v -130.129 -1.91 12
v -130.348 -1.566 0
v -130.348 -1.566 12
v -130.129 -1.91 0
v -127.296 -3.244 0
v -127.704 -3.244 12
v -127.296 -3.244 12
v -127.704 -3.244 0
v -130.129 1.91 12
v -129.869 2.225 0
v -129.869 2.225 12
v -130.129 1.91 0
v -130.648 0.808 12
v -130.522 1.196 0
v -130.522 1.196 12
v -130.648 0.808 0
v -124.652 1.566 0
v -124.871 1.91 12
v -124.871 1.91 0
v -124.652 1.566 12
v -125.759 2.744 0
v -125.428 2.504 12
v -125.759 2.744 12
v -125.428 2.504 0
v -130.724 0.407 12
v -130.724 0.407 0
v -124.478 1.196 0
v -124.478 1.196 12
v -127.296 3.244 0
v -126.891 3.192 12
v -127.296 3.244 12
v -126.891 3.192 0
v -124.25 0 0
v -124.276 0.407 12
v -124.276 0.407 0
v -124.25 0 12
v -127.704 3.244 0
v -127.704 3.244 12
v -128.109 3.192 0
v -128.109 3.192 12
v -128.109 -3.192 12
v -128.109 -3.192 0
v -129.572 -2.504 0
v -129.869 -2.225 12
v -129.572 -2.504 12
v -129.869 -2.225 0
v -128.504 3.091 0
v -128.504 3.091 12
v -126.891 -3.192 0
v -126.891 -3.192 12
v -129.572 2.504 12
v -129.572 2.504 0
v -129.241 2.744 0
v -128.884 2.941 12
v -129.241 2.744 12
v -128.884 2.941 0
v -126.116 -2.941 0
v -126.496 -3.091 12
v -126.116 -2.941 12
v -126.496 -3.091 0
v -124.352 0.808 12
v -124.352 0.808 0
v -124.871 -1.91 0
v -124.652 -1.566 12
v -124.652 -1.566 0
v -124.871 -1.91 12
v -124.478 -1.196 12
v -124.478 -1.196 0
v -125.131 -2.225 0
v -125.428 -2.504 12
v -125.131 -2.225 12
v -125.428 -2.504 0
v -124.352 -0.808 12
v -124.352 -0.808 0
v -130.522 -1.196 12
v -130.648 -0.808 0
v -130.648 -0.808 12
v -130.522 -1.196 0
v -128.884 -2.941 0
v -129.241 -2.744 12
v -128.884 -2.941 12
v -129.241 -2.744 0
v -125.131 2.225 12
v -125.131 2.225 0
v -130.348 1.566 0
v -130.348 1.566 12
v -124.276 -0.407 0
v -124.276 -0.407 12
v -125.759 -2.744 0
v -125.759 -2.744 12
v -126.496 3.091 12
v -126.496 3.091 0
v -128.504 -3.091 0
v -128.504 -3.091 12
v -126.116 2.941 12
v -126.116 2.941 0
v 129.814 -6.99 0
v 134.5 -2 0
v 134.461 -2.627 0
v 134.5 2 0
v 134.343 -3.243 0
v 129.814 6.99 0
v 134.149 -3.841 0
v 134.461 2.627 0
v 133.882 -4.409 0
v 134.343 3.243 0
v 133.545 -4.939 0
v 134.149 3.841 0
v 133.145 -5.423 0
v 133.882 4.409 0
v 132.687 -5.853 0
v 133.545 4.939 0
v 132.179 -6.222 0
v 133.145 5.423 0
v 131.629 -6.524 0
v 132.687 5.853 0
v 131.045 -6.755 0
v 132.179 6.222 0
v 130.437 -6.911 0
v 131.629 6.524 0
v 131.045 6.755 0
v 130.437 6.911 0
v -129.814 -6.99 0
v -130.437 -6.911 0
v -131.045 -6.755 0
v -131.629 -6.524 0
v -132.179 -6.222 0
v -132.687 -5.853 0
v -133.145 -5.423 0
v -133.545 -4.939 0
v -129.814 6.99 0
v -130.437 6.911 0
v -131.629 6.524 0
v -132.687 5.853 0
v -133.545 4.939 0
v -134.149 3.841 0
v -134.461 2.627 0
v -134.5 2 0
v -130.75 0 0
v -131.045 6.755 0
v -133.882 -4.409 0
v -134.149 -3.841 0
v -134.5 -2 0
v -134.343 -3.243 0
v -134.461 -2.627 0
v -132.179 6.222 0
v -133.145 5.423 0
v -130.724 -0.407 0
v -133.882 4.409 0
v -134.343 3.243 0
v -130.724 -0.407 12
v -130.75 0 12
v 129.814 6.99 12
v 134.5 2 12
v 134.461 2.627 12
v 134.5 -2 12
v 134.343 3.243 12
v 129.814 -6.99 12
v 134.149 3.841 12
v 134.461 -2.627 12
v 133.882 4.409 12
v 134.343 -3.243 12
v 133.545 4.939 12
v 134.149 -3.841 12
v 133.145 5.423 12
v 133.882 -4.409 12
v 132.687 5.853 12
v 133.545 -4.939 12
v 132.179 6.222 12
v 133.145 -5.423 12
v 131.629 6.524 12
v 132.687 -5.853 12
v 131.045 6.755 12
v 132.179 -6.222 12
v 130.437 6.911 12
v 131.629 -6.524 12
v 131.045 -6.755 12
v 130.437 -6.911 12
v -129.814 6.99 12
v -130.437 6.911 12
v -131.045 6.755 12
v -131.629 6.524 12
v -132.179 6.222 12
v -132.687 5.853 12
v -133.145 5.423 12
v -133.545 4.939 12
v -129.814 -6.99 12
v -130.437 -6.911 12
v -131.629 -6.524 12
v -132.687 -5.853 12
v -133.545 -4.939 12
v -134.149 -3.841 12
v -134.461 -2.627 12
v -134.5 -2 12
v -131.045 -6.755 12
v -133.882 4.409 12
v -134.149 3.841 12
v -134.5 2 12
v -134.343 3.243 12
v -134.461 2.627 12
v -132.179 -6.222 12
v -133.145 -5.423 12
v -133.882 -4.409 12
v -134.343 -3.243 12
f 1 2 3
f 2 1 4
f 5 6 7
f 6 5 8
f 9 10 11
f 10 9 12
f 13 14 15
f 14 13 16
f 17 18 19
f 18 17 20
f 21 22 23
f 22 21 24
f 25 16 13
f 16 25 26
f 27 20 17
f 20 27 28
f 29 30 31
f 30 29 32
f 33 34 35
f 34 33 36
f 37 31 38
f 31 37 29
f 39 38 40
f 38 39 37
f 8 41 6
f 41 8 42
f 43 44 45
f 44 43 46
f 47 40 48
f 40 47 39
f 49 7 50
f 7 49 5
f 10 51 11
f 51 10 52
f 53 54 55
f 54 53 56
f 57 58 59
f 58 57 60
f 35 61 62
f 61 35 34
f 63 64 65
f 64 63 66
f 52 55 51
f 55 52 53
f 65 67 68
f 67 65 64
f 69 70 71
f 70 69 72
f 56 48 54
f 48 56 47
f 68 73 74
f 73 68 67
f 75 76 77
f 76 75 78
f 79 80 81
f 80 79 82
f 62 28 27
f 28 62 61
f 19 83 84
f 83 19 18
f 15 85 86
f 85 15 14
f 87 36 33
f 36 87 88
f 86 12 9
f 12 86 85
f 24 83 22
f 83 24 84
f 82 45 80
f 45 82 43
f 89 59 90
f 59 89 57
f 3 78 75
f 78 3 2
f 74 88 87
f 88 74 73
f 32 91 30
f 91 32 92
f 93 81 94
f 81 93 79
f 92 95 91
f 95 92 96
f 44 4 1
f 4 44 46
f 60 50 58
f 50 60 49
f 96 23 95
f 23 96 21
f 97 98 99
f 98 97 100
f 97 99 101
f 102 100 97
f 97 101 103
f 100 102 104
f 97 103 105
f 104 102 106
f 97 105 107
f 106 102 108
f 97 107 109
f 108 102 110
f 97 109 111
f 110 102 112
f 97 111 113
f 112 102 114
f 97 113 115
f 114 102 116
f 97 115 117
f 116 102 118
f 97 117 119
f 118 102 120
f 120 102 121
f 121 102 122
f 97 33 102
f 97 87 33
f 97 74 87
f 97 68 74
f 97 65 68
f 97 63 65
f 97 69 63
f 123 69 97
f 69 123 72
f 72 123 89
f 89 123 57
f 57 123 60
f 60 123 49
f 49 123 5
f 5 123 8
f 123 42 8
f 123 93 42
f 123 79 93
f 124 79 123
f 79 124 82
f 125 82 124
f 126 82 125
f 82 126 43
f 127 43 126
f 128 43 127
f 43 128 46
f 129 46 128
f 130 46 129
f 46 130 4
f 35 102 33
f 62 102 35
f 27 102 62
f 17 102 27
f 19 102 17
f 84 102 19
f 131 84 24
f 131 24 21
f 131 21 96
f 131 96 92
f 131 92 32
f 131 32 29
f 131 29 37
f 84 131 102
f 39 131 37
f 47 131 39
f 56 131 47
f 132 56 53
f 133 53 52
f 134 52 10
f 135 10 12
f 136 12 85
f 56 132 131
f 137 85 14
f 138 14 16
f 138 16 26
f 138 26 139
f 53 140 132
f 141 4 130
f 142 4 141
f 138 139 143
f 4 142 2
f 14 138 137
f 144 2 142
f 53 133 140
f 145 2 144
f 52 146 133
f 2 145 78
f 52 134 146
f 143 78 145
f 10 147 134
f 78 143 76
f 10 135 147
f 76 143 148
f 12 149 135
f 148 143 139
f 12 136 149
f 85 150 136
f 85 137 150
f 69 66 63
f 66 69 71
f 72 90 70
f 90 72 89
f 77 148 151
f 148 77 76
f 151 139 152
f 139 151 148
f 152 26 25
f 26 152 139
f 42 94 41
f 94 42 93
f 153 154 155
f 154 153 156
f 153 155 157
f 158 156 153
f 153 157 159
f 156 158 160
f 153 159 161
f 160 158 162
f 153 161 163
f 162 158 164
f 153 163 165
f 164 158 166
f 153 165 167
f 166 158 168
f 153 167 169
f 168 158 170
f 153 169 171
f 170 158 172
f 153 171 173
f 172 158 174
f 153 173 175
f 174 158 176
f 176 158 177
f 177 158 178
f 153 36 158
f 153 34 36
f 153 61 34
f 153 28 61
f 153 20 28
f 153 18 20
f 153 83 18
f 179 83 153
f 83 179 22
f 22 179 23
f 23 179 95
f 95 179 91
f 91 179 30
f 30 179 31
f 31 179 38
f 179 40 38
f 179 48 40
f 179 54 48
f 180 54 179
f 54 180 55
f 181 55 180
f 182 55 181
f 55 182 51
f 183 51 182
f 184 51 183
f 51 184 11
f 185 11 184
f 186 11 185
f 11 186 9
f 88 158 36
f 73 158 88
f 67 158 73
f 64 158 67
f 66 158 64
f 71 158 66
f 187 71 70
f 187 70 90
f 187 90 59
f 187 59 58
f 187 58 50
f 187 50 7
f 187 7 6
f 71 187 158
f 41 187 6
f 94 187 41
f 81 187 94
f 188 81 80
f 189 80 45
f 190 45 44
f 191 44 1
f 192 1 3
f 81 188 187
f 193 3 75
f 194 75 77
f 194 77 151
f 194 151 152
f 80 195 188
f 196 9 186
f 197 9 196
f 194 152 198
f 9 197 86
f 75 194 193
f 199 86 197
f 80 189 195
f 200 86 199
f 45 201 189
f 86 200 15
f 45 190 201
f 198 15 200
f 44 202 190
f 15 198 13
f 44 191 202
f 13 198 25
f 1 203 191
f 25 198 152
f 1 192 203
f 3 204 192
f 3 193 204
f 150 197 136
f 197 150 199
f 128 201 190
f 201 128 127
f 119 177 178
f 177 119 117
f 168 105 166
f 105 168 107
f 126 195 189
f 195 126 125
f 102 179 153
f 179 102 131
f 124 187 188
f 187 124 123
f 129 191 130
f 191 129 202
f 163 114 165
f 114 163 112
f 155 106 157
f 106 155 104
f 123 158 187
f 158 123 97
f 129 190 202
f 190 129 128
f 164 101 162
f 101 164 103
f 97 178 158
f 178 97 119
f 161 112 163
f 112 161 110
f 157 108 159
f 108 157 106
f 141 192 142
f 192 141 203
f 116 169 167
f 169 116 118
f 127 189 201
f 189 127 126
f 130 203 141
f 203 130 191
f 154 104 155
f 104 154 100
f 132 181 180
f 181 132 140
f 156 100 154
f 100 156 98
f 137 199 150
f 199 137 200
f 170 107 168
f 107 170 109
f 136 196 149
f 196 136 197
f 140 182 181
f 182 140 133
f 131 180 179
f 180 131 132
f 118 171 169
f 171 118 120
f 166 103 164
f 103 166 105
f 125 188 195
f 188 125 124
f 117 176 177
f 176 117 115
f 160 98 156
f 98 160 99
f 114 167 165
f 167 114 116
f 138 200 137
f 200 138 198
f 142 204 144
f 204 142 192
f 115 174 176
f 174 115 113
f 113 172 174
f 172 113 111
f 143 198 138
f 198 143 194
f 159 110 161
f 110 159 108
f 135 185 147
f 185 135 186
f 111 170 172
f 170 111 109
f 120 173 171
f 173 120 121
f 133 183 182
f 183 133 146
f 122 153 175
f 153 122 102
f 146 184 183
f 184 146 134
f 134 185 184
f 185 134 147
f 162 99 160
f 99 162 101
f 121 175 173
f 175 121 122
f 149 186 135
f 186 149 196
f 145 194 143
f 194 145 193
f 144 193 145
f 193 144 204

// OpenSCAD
$fn = 50;


difference() {
	union() {
		hull() {
			translate(v = [-129.5000000000, 2.0000000000, 0]) {
				cylinder(h = 12, r = 5);
			}
			translate(v = [129.5000000000, 2.0000000000, 0]) {
				cylinder(h = 12, r = 5);
			}
			translate(v = [-129.5000000000, -2.0000000000, 0]) {
				cylinder(h = 12, r = 5);
			}
			translate(v = [129.5000000000, -2.0000000000, 0]) {
				cylinder(h = 12, r = 5);
			}
		}
	}
	union() {
		translate(v = [-127.5000000000, 0.0000000000, 0]) {
			cylinder(h = 12, r = 3.2500000000);
		}
		translate(v = [-127.5000000000, 0.0000000000, 0]) {
			cylinder(h = 12, r = 1.8000000000);
		}
		translate(v = [-127.5000000000, 0.0000000000, 0]) {
			cylinder(h = 12, r = 1.8000000000);
		}
		translate(v = [-127.5000000000, 0.0000000000, 0]) {
			cylinder(h = 12, r = 1.8000000000);
		}
	}
}
